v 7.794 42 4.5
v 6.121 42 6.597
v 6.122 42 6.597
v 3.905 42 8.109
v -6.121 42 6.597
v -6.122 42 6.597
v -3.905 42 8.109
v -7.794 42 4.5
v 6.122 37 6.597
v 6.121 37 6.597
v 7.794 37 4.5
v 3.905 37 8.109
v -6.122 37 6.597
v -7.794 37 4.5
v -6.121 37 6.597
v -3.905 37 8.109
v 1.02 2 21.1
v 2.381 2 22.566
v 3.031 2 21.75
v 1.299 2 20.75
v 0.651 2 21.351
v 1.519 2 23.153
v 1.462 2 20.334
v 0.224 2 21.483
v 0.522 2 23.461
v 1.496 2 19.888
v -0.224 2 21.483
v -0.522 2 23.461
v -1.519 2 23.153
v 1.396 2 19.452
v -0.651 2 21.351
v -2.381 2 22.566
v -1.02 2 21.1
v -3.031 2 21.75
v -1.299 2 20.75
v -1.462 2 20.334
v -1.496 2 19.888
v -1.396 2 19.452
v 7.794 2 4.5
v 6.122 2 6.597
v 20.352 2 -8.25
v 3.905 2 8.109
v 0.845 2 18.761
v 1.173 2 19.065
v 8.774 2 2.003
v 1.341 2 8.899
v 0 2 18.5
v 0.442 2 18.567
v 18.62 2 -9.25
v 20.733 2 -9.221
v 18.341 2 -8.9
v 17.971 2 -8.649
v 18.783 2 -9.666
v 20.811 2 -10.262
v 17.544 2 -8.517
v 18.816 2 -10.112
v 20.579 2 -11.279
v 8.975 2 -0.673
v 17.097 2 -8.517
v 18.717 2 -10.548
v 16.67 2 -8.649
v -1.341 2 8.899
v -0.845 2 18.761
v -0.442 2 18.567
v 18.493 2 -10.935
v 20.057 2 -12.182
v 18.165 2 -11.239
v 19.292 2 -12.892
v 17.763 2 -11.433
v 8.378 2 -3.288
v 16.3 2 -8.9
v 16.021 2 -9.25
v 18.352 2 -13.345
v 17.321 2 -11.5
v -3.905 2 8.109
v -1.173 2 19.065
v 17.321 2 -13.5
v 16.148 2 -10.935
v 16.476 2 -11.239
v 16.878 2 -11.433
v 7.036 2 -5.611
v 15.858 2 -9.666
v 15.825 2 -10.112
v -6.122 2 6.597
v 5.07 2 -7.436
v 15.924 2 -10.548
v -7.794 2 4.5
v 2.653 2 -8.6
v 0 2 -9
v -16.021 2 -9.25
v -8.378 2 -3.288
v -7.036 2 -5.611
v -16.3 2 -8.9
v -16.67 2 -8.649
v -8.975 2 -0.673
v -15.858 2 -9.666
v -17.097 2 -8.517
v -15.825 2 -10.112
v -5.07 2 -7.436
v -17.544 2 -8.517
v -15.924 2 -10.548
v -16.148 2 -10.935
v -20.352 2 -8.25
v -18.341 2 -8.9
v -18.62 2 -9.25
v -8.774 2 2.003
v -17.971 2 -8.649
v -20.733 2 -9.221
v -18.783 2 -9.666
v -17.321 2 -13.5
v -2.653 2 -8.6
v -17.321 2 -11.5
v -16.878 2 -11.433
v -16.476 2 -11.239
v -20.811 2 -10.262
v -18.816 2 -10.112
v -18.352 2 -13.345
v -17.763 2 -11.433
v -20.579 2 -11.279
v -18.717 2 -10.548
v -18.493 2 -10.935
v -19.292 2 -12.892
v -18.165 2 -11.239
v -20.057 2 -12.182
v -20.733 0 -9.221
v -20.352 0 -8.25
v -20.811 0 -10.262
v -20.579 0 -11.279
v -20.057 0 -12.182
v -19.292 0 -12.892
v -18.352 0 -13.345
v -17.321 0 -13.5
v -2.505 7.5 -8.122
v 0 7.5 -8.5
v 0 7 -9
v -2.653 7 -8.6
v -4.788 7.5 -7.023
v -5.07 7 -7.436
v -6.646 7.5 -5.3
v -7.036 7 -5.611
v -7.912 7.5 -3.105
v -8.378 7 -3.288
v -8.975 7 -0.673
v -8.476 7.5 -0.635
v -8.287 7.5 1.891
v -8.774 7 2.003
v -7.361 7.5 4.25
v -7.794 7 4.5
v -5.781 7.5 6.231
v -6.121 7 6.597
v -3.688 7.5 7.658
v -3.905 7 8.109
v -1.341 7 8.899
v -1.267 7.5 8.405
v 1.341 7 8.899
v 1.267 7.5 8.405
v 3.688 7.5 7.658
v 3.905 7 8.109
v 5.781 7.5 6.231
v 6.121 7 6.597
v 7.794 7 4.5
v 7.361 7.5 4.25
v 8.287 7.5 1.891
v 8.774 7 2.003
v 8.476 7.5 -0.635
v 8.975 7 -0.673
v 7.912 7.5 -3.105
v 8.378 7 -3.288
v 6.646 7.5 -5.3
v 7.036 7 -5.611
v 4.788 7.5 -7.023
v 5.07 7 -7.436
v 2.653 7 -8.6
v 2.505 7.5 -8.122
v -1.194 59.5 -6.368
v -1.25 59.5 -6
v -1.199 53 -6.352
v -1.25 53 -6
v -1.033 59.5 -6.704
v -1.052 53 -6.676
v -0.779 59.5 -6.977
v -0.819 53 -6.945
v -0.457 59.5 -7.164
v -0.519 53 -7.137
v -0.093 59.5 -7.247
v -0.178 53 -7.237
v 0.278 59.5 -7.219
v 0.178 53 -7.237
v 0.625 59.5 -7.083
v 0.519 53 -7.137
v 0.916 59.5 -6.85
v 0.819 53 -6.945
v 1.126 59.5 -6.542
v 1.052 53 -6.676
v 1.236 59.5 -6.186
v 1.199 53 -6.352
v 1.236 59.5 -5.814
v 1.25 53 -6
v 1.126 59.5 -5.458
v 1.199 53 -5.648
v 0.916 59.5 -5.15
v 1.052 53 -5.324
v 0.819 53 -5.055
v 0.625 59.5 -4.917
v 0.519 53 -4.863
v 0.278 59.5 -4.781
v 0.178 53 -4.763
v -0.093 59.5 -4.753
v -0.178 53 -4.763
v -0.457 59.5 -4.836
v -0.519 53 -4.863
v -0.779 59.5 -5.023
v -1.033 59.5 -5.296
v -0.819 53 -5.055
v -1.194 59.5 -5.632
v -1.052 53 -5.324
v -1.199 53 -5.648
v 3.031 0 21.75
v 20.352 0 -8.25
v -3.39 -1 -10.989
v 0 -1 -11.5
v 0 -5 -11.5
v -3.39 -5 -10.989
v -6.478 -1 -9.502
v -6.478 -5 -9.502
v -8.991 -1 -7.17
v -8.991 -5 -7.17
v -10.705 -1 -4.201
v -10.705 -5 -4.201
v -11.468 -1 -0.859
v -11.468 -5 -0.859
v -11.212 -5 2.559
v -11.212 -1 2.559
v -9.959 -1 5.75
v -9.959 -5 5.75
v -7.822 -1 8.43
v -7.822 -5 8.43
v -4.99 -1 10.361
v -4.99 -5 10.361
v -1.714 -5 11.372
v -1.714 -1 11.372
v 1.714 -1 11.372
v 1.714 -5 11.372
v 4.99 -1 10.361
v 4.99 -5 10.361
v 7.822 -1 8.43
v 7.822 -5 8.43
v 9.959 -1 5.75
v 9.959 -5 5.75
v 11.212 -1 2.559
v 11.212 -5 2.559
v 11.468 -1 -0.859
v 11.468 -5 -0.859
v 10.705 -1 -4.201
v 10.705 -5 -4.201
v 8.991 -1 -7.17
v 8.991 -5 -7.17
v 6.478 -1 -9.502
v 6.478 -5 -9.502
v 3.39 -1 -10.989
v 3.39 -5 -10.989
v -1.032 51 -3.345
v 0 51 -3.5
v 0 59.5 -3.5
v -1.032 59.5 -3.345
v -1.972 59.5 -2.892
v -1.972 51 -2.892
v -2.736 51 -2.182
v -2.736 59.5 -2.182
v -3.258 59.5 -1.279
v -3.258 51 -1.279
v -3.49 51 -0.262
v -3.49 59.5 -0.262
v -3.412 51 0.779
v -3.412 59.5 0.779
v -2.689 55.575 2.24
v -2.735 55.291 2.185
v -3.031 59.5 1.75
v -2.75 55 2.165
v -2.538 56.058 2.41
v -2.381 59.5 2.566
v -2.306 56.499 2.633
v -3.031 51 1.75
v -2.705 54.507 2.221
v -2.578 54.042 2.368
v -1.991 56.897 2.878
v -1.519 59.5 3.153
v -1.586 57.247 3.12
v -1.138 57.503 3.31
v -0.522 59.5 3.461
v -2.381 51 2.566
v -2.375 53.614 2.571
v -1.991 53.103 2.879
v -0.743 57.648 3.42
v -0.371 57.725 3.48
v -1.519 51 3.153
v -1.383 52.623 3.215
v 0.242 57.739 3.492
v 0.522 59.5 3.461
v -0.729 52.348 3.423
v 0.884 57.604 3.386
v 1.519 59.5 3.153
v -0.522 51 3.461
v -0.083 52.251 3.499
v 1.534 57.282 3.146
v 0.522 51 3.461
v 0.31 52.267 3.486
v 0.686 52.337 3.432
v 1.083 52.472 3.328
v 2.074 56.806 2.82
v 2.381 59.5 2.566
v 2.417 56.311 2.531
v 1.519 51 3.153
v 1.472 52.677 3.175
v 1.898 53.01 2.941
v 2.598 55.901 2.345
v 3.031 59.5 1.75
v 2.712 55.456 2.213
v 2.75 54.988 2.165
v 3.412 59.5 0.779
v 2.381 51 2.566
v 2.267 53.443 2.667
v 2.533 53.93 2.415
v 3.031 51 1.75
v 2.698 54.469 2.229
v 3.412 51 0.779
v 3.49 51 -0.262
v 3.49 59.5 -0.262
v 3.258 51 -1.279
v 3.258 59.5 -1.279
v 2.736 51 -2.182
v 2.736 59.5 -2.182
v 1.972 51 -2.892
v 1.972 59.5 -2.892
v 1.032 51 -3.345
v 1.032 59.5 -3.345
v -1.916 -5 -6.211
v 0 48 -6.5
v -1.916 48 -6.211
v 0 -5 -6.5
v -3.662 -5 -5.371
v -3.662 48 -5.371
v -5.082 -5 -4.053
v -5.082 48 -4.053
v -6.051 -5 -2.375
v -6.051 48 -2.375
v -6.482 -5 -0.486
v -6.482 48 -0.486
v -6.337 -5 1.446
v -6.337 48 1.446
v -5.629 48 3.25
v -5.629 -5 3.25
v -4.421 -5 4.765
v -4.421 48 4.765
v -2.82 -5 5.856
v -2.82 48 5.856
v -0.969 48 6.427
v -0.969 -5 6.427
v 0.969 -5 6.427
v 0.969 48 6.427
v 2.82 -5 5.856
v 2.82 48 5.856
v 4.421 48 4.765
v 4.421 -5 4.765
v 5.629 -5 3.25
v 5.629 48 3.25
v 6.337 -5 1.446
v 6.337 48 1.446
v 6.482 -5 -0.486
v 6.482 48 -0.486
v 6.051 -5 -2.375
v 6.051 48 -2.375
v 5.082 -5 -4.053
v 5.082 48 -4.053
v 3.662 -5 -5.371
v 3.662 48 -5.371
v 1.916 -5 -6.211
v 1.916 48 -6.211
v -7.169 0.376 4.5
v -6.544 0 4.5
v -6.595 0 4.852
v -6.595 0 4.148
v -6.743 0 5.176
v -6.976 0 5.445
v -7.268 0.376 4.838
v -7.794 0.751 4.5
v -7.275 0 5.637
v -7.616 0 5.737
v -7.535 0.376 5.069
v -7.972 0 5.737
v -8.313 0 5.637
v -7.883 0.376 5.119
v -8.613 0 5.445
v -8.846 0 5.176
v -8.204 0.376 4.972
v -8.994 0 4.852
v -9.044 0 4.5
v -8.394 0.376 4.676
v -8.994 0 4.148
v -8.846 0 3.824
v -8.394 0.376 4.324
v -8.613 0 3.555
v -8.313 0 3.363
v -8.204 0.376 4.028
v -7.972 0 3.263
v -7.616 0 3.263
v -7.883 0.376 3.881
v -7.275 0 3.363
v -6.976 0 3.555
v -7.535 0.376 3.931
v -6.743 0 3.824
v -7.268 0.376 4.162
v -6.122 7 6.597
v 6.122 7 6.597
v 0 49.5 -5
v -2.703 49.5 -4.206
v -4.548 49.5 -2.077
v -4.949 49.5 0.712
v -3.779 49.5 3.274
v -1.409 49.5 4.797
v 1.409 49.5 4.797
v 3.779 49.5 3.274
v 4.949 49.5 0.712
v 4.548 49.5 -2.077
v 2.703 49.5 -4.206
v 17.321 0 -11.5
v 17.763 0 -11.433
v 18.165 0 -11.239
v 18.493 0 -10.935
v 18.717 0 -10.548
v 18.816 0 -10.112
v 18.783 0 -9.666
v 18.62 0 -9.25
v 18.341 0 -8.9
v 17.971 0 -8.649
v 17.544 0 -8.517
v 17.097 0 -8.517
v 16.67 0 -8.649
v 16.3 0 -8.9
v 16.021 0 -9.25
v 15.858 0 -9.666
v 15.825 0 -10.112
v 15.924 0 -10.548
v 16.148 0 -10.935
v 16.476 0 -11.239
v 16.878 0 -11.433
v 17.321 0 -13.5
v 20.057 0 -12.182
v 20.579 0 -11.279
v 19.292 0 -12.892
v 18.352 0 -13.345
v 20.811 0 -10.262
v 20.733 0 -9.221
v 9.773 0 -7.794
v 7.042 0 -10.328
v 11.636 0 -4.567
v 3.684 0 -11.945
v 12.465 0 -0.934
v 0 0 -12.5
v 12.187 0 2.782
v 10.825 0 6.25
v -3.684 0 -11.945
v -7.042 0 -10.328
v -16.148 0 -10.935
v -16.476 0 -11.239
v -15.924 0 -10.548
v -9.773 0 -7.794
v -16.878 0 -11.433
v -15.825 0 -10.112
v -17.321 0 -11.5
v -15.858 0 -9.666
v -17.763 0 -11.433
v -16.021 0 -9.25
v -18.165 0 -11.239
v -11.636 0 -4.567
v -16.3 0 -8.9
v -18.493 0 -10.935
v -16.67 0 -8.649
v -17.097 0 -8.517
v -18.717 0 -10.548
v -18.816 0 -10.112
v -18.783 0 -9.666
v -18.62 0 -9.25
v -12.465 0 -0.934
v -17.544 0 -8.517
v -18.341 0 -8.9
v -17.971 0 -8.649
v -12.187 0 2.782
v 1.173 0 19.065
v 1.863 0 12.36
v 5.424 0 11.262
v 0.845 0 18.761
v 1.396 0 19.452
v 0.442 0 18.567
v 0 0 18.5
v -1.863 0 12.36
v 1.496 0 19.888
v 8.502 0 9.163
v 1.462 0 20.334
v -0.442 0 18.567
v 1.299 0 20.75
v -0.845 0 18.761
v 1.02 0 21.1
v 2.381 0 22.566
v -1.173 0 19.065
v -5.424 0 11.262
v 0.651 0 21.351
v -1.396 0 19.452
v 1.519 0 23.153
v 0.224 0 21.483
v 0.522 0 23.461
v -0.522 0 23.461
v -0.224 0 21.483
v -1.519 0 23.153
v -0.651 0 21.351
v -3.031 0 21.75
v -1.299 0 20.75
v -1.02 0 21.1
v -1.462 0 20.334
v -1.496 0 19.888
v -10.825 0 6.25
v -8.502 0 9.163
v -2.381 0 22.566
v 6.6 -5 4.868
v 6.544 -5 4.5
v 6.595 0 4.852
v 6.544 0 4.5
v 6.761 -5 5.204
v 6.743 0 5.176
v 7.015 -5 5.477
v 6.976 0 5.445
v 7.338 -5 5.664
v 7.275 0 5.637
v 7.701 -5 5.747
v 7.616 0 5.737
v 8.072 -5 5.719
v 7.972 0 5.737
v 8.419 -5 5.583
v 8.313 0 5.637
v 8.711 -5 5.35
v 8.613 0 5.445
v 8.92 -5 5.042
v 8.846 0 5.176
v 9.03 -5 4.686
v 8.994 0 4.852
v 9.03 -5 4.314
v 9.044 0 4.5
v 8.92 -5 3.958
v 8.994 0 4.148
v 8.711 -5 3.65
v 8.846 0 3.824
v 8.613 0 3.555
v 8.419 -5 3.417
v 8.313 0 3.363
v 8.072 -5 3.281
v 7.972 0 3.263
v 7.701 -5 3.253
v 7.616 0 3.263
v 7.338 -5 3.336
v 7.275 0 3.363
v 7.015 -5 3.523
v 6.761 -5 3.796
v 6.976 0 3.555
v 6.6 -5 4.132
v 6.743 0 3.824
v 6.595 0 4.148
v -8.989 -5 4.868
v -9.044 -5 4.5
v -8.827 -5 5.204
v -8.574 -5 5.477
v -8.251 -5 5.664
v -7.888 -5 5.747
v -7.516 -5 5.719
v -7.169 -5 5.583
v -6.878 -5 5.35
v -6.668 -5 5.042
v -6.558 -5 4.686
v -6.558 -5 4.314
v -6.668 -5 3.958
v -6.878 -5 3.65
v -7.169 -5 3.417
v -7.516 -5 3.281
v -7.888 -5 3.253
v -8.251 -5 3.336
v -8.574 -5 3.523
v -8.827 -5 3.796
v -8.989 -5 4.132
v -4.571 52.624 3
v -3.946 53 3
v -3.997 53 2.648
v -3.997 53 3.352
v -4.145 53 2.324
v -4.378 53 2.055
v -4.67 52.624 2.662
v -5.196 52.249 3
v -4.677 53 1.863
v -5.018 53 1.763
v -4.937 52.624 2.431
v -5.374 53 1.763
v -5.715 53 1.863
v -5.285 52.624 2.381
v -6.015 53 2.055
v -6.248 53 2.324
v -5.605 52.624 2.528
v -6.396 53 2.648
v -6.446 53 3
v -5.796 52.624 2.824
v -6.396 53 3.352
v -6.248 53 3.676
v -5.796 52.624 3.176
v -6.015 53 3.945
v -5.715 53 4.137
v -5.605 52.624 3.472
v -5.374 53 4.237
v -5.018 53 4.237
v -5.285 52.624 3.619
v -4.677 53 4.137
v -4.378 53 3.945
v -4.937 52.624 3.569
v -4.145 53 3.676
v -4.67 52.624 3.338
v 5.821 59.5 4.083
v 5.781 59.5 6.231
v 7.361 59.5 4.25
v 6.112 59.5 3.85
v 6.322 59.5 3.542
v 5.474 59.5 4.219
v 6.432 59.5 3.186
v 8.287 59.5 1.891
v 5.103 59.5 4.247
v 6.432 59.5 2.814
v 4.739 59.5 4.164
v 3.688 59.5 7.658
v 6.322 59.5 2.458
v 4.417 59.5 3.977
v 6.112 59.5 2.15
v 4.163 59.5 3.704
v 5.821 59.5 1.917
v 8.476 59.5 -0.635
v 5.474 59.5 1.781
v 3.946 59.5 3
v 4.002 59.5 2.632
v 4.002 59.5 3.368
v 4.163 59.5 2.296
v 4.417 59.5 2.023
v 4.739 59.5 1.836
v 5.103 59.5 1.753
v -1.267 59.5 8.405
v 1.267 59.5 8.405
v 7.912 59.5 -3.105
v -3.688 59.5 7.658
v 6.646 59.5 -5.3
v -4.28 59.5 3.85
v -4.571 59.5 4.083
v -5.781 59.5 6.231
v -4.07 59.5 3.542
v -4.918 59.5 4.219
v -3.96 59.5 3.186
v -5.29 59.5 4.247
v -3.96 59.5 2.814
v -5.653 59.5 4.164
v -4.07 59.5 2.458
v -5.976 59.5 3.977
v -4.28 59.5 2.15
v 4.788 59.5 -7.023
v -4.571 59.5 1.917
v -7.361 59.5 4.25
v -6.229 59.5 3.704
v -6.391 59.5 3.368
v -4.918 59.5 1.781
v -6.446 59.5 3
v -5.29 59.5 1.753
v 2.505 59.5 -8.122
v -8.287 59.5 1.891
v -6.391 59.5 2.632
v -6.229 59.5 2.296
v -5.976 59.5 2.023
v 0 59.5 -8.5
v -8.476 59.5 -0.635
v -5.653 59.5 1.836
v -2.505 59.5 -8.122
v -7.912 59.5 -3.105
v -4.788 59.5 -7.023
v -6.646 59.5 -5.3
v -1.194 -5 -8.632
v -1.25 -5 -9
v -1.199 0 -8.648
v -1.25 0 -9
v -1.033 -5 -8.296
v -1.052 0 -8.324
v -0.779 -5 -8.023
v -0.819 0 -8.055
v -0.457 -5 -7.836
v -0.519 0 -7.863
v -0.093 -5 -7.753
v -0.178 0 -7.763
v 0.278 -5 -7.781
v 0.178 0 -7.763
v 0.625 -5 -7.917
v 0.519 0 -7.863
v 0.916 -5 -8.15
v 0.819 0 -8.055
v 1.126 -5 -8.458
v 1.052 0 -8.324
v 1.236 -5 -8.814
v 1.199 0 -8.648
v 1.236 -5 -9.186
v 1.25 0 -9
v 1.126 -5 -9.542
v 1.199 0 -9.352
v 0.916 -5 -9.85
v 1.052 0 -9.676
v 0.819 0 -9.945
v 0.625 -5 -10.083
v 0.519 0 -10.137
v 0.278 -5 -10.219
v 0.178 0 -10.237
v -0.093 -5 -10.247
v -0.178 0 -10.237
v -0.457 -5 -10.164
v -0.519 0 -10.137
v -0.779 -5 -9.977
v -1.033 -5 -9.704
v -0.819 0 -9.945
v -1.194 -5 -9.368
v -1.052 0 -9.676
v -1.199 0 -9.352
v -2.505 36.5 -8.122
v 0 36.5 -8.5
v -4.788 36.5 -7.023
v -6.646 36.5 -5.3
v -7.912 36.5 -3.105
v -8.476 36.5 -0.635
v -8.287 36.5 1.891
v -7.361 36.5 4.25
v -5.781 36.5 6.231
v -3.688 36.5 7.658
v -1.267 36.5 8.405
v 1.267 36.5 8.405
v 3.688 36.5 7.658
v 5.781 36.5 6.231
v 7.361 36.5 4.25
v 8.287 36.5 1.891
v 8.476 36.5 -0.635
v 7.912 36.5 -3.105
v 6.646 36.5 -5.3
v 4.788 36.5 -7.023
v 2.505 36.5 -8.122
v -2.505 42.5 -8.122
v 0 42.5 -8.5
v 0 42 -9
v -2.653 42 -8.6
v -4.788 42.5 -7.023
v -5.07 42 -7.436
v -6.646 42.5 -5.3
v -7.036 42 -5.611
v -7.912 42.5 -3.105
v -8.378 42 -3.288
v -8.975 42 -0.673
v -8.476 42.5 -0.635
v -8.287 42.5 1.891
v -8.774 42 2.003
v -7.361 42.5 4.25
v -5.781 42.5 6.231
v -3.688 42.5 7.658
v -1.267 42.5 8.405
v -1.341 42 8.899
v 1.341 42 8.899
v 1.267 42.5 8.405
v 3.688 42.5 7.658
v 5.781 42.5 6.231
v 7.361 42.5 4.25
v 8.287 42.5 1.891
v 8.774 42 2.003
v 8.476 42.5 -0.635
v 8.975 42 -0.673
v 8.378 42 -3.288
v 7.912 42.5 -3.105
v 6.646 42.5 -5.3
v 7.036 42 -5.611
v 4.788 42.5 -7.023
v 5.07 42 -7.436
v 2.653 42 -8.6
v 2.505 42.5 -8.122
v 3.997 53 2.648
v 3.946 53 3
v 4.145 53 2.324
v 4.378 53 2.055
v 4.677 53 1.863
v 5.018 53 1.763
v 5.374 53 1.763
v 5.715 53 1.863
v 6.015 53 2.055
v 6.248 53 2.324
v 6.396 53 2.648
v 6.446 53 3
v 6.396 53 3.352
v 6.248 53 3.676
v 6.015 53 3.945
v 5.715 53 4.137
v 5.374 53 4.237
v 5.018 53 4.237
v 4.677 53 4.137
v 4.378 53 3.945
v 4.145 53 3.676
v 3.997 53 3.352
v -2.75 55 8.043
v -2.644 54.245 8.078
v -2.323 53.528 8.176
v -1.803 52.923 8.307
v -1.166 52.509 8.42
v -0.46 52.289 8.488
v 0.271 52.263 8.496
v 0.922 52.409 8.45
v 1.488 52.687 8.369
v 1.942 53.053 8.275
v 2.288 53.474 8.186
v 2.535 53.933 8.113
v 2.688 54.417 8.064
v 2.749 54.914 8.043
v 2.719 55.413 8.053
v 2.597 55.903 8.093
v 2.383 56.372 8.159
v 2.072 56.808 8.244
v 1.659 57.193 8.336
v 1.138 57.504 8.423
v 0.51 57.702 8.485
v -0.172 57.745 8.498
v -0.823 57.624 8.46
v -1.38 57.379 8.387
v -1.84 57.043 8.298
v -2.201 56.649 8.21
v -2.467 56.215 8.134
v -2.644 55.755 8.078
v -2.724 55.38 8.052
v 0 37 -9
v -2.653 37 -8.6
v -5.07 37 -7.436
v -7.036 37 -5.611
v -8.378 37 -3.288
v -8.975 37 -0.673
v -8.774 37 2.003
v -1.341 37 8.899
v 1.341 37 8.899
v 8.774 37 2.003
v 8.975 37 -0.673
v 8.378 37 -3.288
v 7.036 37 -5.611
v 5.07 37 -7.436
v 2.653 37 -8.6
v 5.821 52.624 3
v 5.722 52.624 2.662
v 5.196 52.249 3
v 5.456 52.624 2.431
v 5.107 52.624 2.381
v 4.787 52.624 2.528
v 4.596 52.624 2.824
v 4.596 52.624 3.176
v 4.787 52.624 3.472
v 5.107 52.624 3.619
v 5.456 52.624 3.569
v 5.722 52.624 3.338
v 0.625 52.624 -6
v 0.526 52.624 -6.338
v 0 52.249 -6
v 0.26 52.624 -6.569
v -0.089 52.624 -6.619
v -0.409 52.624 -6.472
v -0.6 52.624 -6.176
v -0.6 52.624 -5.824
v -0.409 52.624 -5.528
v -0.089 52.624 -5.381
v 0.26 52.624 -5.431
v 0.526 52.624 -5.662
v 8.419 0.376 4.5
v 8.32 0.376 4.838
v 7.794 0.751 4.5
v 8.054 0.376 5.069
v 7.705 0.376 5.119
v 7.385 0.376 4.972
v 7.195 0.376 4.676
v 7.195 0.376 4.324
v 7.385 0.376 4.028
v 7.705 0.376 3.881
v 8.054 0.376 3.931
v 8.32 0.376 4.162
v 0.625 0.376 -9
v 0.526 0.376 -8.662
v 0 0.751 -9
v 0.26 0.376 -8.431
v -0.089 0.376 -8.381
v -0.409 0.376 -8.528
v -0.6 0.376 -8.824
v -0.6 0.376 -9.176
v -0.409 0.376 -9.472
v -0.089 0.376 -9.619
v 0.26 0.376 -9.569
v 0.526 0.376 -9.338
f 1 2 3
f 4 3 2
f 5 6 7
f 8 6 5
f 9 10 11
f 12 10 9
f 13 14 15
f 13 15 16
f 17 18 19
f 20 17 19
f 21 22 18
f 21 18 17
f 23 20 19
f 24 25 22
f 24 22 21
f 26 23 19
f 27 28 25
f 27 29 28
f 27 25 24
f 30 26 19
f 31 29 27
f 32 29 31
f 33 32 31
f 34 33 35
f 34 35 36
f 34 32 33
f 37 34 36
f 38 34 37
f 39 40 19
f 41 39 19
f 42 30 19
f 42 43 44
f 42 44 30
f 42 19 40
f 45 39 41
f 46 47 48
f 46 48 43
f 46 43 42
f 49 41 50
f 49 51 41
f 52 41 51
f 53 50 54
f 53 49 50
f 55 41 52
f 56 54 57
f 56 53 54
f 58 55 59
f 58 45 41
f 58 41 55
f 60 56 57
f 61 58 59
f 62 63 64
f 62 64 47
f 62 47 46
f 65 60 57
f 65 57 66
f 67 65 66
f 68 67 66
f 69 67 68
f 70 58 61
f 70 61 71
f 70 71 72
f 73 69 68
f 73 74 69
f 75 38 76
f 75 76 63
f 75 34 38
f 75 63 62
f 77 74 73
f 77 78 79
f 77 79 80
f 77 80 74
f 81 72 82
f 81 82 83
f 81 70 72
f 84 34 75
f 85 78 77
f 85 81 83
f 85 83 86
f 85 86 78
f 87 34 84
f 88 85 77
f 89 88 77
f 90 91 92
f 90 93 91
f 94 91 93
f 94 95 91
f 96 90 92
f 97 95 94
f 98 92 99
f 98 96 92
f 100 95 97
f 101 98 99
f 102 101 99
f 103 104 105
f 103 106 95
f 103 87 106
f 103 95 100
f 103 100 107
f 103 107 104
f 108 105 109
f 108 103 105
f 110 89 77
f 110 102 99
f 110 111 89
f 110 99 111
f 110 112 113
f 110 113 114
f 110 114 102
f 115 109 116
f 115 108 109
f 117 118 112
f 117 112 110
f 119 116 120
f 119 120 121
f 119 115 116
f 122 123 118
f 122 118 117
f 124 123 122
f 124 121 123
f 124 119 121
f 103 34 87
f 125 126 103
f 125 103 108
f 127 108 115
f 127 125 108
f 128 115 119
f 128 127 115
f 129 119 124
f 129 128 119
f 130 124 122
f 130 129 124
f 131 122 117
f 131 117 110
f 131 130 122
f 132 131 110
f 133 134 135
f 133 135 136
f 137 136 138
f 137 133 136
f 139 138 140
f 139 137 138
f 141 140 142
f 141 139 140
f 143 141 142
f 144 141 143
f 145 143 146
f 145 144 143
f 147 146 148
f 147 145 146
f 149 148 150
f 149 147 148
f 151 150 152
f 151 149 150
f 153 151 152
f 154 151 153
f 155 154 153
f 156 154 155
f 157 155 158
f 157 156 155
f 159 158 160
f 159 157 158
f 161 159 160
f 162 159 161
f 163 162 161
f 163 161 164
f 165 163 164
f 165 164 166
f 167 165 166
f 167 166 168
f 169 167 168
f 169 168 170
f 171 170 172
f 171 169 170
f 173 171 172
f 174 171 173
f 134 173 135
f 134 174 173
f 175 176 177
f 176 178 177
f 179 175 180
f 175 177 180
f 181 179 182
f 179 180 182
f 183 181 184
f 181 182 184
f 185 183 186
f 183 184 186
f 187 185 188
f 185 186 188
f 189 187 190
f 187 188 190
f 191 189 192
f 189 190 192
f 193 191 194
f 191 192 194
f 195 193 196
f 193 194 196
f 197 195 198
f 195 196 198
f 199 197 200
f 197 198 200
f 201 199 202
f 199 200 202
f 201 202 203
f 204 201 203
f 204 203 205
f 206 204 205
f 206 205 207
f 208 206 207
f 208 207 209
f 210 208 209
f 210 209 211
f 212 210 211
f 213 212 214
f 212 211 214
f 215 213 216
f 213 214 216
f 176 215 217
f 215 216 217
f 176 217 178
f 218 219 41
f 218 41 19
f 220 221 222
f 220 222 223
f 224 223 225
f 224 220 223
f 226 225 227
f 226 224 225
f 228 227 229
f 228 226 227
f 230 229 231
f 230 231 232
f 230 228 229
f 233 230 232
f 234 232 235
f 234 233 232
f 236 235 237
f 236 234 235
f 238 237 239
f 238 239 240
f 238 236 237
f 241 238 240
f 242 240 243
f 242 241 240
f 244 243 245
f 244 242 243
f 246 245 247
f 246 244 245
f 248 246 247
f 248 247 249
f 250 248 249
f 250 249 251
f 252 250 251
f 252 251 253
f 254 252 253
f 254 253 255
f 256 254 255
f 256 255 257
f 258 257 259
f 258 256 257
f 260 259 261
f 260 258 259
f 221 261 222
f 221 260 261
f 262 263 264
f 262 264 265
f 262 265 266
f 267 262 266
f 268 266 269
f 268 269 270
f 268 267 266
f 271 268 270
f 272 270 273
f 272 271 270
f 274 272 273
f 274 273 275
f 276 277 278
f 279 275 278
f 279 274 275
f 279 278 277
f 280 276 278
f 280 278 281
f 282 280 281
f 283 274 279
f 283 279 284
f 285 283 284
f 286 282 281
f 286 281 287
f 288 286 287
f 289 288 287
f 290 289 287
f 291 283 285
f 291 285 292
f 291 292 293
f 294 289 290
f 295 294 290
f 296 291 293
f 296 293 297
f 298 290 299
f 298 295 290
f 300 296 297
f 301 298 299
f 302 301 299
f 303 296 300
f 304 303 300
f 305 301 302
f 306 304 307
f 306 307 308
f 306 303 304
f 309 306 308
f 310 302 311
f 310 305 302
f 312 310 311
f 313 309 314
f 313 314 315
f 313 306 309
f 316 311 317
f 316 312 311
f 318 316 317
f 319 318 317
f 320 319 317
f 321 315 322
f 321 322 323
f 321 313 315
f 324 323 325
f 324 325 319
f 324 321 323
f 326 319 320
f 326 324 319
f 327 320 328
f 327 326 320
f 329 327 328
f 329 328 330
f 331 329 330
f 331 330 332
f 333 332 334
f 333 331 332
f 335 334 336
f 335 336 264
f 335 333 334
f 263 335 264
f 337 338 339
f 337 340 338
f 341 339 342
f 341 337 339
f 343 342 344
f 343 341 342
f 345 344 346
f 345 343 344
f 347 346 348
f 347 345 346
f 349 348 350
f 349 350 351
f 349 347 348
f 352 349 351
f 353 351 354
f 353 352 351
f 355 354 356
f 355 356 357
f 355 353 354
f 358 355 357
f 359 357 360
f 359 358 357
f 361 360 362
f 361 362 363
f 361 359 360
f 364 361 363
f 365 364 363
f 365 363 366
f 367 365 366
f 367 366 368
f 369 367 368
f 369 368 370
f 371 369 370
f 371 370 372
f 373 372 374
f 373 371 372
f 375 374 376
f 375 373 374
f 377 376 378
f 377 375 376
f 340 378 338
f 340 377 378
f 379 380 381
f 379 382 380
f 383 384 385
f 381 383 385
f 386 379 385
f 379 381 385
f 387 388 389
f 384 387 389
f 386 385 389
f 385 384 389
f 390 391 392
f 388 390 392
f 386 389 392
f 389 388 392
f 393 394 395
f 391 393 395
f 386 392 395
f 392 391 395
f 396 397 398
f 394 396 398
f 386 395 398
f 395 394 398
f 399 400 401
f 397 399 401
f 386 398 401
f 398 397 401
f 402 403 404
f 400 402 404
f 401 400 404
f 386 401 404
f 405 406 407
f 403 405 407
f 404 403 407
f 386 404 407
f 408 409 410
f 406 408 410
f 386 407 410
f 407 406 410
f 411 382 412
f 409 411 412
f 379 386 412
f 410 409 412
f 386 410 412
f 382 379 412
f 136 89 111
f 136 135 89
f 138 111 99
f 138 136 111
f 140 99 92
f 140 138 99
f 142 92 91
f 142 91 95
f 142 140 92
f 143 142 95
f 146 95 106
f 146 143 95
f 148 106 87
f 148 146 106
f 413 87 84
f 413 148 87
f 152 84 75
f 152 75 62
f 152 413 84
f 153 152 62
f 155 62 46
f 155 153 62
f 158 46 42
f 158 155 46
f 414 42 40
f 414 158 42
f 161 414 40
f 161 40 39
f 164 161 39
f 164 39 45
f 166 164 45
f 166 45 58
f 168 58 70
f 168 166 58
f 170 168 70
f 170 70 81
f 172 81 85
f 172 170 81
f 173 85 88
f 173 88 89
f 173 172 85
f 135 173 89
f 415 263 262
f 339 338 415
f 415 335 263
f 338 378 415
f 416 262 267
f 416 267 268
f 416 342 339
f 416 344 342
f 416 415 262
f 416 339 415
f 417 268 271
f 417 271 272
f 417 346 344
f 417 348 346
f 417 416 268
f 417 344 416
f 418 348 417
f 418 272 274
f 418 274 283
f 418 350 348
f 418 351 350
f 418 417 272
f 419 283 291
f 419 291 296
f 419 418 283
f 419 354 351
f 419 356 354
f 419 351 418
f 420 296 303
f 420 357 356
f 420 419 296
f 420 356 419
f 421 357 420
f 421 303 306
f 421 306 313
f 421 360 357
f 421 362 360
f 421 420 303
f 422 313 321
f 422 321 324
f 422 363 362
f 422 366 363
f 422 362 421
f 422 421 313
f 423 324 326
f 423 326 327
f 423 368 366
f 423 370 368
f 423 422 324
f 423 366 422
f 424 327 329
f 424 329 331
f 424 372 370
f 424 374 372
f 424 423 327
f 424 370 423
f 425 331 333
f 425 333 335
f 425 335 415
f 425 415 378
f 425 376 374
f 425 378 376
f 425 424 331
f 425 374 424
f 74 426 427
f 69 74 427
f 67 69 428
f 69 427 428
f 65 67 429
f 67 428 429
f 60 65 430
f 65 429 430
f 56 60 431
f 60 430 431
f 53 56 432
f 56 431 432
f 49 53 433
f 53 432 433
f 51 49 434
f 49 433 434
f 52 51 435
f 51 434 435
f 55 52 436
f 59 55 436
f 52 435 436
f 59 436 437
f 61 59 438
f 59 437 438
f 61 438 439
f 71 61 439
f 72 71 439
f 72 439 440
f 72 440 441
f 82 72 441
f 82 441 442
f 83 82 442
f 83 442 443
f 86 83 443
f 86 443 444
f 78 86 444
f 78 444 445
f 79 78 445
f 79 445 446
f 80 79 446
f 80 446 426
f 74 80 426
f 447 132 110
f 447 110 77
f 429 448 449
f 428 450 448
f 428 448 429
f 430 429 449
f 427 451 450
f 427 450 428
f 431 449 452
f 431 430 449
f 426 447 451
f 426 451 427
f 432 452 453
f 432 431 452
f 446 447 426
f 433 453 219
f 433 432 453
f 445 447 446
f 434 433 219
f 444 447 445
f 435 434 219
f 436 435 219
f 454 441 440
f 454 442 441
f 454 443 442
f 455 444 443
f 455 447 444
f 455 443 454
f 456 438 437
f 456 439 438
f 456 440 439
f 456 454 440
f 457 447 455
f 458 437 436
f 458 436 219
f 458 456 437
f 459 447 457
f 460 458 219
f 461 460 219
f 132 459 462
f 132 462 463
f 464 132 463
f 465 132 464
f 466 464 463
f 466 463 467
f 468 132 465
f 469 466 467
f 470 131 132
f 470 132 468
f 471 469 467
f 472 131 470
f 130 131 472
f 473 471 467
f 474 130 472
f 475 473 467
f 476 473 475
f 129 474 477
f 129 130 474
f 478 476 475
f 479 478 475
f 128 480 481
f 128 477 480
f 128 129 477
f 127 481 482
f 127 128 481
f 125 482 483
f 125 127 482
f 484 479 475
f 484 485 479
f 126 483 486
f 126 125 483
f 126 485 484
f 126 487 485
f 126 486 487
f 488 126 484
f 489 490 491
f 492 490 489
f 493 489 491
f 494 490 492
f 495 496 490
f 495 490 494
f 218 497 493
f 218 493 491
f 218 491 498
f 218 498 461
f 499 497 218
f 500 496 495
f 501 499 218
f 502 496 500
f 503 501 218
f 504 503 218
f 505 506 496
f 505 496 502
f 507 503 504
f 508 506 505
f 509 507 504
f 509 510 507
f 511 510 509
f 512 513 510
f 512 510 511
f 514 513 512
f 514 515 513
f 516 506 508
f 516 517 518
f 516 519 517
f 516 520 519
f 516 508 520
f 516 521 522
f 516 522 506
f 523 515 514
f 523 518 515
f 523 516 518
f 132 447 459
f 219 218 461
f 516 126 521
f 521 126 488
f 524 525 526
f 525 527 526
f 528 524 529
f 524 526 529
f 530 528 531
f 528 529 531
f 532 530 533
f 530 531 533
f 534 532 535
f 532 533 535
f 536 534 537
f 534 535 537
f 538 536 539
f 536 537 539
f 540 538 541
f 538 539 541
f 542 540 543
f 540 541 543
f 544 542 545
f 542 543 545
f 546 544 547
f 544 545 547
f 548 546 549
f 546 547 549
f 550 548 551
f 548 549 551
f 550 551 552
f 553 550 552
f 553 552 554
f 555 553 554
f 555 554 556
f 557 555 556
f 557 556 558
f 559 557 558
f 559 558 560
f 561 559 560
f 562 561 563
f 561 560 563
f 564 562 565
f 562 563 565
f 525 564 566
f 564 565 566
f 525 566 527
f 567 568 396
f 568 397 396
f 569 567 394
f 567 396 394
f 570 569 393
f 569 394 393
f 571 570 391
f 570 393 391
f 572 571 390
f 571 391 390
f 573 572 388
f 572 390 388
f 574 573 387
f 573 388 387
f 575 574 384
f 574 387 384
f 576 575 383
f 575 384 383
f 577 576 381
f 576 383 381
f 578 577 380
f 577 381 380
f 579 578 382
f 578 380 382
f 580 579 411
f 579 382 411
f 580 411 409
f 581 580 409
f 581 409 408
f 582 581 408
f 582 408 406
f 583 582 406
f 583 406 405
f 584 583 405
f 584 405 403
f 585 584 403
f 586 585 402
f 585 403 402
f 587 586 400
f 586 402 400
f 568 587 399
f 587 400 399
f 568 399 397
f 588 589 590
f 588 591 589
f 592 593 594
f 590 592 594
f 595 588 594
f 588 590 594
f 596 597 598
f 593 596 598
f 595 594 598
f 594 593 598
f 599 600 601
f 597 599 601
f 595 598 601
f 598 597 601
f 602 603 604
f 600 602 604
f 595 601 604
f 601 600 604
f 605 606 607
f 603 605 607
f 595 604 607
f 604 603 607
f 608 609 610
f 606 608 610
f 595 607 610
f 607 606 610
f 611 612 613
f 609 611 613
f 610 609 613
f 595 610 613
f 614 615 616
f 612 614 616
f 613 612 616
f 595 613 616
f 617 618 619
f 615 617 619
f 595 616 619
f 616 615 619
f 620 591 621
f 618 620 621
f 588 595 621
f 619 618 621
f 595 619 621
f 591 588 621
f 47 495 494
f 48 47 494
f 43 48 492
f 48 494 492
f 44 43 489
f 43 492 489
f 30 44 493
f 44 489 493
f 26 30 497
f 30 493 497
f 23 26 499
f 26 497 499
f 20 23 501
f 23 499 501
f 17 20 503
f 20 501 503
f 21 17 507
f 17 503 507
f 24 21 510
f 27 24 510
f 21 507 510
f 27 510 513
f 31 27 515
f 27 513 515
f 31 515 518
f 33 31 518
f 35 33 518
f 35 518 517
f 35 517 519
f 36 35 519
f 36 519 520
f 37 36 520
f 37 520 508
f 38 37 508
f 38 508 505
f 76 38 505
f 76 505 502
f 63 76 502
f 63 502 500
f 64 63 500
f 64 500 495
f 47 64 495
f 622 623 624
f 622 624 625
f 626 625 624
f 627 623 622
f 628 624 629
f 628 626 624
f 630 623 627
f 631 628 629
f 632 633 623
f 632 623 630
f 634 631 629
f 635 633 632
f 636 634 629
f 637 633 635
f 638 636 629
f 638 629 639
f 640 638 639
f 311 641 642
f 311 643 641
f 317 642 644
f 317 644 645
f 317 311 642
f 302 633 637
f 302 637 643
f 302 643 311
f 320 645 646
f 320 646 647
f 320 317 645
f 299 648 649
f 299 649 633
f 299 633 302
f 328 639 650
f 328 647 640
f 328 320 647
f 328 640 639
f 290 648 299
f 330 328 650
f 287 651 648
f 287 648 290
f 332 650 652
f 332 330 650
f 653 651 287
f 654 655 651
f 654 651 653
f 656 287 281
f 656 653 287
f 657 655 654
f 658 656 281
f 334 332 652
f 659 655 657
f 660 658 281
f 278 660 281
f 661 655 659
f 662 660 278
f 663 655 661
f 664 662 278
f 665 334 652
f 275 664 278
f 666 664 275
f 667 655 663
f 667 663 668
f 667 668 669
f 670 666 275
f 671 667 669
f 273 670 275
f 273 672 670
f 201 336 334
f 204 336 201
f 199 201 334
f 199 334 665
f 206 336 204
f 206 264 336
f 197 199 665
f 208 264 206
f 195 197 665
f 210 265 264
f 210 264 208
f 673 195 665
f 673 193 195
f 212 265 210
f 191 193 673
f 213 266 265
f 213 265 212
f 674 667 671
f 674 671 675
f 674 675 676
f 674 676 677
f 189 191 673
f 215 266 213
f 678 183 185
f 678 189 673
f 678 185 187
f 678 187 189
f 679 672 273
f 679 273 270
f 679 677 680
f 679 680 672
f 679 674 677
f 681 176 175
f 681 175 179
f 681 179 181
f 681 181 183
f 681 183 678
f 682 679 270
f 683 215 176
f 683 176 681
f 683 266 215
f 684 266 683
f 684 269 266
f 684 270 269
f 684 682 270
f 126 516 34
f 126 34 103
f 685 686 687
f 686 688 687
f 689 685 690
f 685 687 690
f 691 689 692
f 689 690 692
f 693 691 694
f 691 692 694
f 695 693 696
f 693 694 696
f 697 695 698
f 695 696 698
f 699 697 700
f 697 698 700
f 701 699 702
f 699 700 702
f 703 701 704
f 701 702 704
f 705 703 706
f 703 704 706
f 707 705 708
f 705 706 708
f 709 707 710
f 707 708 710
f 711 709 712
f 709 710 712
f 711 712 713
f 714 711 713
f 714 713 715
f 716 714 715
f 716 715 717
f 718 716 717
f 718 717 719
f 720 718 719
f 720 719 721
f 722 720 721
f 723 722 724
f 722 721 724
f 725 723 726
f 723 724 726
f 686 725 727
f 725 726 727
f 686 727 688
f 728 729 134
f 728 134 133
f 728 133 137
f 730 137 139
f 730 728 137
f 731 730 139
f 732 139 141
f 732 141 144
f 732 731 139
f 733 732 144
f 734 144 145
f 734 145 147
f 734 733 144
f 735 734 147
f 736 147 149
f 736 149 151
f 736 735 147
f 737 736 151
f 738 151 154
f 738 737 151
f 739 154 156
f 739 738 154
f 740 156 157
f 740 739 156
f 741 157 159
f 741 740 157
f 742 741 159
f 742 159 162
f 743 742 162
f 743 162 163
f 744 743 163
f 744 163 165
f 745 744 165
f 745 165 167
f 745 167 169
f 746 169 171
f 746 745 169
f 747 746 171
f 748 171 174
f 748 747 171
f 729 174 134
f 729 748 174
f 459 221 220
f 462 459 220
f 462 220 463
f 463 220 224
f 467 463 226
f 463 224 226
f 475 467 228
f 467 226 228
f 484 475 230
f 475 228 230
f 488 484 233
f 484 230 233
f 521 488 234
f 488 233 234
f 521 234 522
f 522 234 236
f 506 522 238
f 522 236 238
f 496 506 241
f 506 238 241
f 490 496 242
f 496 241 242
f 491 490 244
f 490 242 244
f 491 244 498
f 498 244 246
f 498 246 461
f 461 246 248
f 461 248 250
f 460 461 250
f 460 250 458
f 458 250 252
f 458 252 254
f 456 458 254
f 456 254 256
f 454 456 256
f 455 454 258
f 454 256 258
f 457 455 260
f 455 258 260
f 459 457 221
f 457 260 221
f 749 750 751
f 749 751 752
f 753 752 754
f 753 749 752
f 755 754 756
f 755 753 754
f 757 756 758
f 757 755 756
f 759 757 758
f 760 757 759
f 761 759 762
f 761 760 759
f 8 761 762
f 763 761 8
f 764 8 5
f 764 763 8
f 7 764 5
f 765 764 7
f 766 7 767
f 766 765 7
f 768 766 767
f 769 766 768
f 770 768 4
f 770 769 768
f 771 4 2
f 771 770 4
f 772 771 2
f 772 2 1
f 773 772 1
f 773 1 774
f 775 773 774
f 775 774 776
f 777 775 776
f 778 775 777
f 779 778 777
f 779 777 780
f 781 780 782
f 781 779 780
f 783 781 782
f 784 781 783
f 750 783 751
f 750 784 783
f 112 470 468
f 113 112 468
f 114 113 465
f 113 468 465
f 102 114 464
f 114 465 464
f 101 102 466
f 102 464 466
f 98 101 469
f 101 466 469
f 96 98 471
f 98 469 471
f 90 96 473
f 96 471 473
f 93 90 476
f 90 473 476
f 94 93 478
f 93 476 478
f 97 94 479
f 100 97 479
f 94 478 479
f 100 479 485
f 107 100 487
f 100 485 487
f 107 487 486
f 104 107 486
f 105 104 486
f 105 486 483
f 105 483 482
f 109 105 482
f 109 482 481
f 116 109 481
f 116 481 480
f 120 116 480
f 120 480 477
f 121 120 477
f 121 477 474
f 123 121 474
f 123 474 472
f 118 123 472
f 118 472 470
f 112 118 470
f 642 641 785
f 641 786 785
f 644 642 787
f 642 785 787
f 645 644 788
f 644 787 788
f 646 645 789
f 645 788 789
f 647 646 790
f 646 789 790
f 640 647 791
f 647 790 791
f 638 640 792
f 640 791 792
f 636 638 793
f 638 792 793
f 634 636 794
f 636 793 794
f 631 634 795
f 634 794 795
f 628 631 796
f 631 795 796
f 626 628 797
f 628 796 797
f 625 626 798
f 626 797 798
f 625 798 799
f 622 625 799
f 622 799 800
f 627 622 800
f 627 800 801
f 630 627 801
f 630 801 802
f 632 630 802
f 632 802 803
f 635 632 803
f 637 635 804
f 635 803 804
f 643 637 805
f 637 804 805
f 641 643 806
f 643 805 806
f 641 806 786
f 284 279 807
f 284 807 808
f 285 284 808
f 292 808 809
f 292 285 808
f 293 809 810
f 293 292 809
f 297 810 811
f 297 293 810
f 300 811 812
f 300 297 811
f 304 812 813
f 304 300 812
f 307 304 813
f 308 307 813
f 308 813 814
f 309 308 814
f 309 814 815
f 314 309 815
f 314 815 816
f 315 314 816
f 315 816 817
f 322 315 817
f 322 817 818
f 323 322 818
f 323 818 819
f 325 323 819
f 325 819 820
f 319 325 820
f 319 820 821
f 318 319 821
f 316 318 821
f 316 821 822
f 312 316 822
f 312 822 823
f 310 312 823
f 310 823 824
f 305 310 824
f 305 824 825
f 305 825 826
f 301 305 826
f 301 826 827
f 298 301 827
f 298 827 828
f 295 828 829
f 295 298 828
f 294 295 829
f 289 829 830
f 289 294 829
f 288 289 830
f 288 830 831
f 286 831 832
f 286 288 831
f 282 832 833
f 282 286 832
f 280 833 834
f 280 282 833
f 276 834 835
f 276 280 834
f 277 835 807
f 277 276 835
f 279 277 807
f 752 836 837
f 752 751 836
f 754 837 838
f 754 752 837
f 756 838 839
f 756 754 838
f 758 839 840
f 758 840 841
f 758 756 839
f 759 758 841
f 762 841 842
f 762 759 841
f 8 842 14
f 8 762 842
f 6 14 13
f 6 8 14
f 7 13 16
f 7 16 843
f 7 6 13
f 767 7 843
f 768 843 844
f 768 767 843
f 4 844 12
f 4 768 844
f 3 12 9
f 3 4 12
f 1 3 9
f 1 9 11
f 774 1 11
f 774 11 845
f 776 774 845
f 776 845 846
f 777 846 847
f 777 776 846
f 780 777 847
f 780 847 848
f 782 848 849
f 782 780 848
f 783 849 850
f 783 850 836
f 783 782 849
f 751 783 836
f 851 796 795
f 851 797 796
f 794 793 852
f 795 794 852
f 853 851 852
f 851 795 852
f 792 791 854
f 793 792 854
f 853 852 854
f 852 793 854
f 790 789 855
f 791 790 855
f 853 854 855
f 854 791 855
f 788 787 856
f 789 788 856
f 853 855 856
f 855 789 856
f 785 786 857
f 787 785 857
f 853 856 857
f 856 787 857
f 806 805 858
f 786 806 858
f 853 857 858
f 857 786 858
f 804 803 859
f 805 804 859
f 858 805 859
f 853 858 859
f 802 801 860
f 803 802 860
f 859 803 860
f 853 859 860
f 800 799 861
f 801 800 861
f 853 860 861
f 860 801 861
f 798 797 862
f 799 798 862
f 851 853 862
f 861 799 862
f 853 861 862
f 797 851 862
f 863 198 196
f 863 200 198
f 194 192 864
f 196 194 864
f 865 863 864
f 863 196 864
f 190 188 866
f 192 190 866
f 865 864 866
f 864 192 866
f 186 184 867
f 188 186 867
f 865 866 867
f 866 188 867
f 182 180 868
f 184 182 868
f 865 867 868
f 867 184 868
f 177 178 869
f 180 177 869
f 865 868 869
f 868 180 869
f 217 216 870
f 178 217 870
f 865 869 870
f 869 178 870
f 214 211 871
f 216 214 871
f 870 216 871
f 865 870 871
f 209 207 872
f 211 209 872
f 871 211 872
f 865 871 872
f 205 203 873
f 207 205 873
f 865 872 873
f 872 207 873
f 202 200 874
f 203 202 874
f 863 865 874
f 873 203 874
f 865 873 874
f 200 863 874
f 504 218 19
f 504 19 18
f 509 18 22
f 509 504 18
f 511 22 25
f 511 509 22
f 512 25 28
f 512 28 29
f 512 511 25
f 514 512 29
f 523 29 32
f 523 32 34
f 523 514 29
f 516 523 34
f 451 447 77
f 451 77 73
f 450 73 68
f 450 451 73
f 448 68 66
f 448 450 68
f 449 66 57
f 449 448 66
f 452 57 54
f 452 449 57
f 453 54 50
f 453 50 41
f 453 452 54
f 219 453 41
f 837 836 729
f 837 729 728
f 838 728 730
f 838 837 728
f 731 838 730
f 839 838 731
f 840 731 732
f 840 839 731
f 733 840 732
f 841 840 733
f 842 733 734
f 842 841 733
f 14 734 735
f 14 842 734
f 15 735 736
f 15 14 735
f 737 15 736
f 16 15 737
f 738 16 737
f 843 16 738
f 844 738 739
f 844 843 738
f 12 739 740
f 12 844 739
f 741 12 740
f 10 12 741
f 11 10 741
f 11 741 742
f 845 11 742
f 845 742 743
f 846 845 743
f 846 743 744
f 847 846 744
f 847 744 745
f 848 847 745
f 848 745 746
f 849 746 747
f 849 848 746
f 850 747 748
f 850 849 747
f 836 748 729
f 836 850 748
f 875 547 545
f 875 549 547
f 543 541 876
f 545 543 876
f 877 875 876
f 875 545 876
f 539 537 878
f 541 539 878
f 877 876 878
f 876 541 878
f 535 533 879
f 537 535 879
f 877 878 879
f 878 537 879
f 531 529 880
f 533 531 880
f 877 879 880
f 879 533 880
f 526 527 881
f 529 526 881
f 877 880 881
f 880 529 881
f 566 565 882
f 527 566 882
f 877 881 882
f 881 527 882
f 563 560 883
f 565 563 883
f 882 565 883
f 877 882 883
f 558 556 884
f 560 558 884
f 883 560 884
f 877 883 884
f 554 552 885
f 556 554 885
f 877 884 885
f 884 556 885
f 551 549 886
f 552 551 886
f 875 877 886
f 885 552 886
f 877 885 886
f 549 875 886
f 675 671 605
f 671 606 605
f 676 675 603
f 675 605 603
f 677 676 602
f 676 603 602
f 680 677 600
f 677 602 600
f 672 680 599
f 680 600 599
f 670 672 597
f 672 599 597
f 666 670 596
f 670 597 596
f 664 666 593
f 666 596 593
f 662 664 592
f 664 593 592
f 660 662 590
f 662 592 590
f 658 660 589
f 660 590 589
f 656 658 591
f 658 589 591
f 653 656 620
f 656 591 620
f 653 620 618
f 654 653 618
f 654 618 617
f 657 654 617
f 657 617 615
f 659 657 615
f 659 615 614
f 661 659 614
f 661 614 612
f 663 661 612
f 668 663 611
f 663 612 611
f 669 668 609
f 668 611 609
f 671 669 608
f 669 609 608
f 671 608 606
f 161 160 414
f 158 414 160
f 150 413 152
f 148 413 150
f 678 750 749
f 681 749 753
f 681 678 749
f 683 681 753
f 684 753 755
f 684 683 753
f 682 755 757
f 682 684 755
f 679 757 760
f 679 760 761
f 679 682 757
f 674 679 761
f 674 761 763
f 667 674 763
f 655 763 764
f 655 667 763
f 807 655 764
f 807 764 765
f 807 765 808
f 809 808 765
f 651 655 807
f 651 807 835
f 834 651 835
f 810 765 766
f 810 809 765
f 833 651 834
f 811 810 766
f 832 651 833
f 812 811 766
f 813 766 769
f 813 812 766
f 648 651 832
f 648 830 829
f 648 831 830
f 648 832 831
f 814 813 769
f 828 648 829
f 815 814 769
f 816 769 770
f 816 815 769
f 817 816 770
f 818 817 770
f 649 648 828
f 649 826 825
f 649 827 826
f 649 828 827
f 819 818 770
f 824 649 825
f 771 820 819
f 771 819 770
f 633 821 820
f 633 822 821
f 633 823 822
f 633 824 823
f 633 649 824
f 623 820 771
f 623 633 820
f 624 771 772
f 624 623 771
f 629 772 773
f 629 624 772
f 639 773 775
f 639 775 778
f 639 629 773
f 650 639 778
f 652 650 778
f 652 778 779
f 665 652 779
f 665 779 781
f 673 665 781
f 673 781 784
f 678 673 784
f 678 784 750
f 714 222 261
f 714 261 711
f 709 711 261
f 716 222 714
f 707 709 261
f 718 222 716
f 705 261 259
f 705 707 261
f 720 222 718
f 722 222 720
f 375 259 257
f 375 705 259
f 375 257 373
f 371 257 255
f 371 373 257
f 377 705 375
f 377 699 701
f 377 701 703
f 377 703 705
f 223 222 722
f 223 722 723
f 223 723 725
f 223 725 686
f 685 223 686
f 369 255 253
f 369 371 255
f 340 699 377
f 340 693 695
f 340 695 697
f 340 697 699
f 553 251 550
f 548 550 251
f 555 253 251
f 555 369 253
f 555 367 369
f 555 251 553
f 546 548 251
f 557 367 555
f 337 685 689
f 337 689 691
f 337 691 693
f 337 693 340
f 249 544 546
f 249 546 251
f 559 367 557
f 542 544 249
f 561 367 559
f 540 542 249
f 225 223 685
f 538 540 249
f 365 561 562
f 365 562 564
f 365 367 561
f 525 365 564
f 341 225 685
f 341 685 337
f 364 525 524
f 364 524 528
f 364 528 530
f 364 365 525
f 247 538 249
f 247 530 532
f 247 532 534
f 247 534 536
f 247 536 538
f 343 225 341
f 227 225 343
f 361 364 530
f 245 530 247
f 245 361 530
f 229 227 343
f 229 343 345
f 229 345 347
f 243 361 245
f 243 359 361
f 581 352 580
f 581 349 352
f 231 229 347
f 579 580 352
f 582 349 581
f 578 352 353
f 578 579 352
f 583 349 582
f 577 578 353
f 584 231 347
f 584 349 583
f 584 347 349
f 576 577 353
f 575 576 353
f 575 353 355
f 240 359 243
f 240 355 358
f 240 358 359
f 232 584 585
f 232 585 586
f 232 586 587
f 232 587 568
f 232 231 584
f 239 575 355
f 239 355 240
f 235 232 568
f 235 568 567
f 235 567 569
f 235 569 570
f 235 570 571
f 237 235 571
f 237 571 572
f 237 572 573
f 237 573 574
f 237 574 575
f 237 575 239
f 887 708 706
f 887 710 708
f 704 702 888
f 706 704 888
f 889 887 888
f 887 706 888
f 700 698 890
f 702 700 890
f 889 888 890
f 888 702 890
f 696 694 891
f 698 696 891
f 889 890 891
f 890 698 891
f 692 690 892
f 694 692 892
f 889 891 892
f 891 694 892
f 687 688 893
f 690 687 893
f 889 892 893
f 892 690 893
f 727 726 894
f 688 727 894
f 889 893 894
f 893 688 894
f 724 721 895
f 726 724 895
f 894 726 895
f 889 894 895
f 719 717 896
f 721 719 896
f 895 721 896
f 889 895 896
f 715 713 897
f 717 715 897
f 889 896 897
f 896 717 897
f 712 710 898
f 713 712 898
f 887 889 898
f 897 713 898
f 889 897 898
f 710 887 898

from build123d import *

# Parameters (mm, degrees)
CHAMFER_1_SIZE         = 0.5
CHAMFER_2_SIZE         = 1
SKETCH_9_OUTSIDE_W     = 67.524
SKETCH_9_OUTSIDE_H     = 67.524
SKETCH_9_OUTSIDE_R     = 1.5
CUT_EXTRUDE_2_DEPTH    = 69.152402746
HOLE_WIZARD_M3_1_D     = 2.5
HOLE_WIZARD_M3_1_DEPTH = 5
HOLE_WIZARD_M3_1_TIP   = 0.751075774
HOLE_WIZARD_M3_2_D     = 2.5
HOLE_WIZARD_M3_2_DEPTH = 6.5
HOLE_WIZARD_M3_2_TIP   = 0.751075774
SKETCH_11_R            = 2.75
CUT_EXTRUDE_4_DEPTH    = 68.275504878


with BuildPart() as part:
    # 草图2 → 旋转1 (revolve)
    with BuildSketch(Plane.XY, mode=Mode.PRIVATE) as revolve_1_sk:
        Polygon((9, 2), (9, 7), (8.5, 7), (8.5, 37), (9, 37), (9, 42), (8.5, 42), (8.5, 59.5), (3.5, 59.5), (3.5, 51), (6.5, 48), (6.5, -5), (11.5, -5), (11.5, 0), (23.5, 0), (23.5, 2), align=None)
    revolve(revolve_1_sk.sketch.rotate(Axis((0, 0, 0), (0, 1, 0)), 90), axis=Axis((0, 0, 0), (0, 1, 0)))

    # 倒角1
    chamfer_1_edges = [part.edges().sort_by_distance(p)[0] for p in [
        (0, 7, 8.5),
        (0, 37, 8.5),
        (0, 42, 8.5),
    ]]
    chamfer(chamfer_1_edges, length=CHAMFER_1_SIZE - 0.0001)  # a hair under: the kernel refuses the full size

    # 倒角2
    chamfer_2_edges = [part.edges().sort_by_distance(p)[0] for p in [
        (0, 0, 11.5),
    ]]
    chamfer(chamfer_2_edges, length=CHAMFER_2_SIZE)

    # 草图9 outside → 切除-拉伸2 (cut, through all)
    # profile 1 of 4: a face of its own
    with BuildSketch(Plane.XZ):
        Rectangle(SKETCH_9_OUTSIDE_W, SKETCH_9_OUTSIDE_H)
        with BuildLine():
            Line((-3.031088913, 21.75), (-20.351596989, -8.25))
            ThreePointArc((-20.351596989, -8.25), (-20.351596989, -11.75), (-17.320508076, -13.5))
            Line((-17.320508076, -13.5), (17.320508076, -13.5))
            ThreePointArc((17.320508076, -13.5), (20.351596989, -11.75), (20.351596989, -8.25))
            Line((20.351596989, -8.25), (3.031088913, 21.75))
            ThreePointArc((3.031088913, 21.75), (0, 23.5), (-3.031088913, 21.75))
        make_face(mode=Mode.SUBTRACT)
    # profile 2 of 4: a face of its own
    with BuildSketch(Plane.XZ):
        with Locations(Location((0, 20, 0), (0, 0, 270))):
            Circle(SKETCH_9_OUTSIDE_R)
    # profile 3 of 4: a face of its own
    with BuildSketch(Plane.XZ):
        with Locations(Location((17.320508076, -10, 0), (0, 0, 270))):
            Circle(SKETCH_9_OUTSIDE_R)
    # profile 4 of 4: a face of its own
    with BuildSketch(Plane.XZ):
        with Locations(Location((-17.320508076, -10, 0), (0, 0, 270))):
            Circle(SKETCH_9_OUTSIDE_R)
    extrude(amount=-CUT_EXTRUDE_2_DEPTH, mode=Mode.SUBTRACT)

    # M3 螺纹孔1
    with Locations(Plane.XZ.offset(5)):
        with Locations((0, -9), (7.794228634, 4.5), (-7.794228634, 4.5)):
            Hole(HOLE_WIZARD_M3_1_D / 2, depth=HOLE_WIZARD_M3_1_DEPTH)
            with Locations((0, 0, -(HOLE_WIZARD_M3_1_DEPTH + HOLE_WIZARD_M3_1_TIP / 2))):  # 118° drill point
                Cone(0, HOLE_WIZARD_M3_1_D / 2, HOLE_WIZARD_M3_1_TIP, mode=Mode.SUBTRACT)

    # M3 螺纹孔2
    with Locations(Plane(origin=(0, 59.5, 0), x_dir=(1, 0, 0), z_dir=(0, 1, 0))):
        with Locations((0, 6), (5.196152423, -3), (-5.196152423, -3)):
            Hole(HOLE_WIZARD_M3_2_D / 2, depth=HOLE_WIZARD_M3_2_DEPTH)
            with Locations((0, 0, -(HOLE_WIZARD_M3_2_DEPTH + HOLE_WIZARD_M3_2_TIP / 2))):  # 118° drill point
                Cone(0, HOLE_WIZARD_M3_2_D / 2, HOLE_WIZARD_M3_2_TIP, mode=Mode.SUBTRACT)

    # 草图11 → 切除-拉伸4 (cut, through all)
    with BuildSketch(Plane.XY):
        with Locations(Location((0, 55, 0), (0, 0, 180))):
            Circle(SKETCH_11_R)
    extrude(amount=CUT_EXTRUDE_4_DEPTH, mode=Mode.SUBTRACT)


solid = part.part
